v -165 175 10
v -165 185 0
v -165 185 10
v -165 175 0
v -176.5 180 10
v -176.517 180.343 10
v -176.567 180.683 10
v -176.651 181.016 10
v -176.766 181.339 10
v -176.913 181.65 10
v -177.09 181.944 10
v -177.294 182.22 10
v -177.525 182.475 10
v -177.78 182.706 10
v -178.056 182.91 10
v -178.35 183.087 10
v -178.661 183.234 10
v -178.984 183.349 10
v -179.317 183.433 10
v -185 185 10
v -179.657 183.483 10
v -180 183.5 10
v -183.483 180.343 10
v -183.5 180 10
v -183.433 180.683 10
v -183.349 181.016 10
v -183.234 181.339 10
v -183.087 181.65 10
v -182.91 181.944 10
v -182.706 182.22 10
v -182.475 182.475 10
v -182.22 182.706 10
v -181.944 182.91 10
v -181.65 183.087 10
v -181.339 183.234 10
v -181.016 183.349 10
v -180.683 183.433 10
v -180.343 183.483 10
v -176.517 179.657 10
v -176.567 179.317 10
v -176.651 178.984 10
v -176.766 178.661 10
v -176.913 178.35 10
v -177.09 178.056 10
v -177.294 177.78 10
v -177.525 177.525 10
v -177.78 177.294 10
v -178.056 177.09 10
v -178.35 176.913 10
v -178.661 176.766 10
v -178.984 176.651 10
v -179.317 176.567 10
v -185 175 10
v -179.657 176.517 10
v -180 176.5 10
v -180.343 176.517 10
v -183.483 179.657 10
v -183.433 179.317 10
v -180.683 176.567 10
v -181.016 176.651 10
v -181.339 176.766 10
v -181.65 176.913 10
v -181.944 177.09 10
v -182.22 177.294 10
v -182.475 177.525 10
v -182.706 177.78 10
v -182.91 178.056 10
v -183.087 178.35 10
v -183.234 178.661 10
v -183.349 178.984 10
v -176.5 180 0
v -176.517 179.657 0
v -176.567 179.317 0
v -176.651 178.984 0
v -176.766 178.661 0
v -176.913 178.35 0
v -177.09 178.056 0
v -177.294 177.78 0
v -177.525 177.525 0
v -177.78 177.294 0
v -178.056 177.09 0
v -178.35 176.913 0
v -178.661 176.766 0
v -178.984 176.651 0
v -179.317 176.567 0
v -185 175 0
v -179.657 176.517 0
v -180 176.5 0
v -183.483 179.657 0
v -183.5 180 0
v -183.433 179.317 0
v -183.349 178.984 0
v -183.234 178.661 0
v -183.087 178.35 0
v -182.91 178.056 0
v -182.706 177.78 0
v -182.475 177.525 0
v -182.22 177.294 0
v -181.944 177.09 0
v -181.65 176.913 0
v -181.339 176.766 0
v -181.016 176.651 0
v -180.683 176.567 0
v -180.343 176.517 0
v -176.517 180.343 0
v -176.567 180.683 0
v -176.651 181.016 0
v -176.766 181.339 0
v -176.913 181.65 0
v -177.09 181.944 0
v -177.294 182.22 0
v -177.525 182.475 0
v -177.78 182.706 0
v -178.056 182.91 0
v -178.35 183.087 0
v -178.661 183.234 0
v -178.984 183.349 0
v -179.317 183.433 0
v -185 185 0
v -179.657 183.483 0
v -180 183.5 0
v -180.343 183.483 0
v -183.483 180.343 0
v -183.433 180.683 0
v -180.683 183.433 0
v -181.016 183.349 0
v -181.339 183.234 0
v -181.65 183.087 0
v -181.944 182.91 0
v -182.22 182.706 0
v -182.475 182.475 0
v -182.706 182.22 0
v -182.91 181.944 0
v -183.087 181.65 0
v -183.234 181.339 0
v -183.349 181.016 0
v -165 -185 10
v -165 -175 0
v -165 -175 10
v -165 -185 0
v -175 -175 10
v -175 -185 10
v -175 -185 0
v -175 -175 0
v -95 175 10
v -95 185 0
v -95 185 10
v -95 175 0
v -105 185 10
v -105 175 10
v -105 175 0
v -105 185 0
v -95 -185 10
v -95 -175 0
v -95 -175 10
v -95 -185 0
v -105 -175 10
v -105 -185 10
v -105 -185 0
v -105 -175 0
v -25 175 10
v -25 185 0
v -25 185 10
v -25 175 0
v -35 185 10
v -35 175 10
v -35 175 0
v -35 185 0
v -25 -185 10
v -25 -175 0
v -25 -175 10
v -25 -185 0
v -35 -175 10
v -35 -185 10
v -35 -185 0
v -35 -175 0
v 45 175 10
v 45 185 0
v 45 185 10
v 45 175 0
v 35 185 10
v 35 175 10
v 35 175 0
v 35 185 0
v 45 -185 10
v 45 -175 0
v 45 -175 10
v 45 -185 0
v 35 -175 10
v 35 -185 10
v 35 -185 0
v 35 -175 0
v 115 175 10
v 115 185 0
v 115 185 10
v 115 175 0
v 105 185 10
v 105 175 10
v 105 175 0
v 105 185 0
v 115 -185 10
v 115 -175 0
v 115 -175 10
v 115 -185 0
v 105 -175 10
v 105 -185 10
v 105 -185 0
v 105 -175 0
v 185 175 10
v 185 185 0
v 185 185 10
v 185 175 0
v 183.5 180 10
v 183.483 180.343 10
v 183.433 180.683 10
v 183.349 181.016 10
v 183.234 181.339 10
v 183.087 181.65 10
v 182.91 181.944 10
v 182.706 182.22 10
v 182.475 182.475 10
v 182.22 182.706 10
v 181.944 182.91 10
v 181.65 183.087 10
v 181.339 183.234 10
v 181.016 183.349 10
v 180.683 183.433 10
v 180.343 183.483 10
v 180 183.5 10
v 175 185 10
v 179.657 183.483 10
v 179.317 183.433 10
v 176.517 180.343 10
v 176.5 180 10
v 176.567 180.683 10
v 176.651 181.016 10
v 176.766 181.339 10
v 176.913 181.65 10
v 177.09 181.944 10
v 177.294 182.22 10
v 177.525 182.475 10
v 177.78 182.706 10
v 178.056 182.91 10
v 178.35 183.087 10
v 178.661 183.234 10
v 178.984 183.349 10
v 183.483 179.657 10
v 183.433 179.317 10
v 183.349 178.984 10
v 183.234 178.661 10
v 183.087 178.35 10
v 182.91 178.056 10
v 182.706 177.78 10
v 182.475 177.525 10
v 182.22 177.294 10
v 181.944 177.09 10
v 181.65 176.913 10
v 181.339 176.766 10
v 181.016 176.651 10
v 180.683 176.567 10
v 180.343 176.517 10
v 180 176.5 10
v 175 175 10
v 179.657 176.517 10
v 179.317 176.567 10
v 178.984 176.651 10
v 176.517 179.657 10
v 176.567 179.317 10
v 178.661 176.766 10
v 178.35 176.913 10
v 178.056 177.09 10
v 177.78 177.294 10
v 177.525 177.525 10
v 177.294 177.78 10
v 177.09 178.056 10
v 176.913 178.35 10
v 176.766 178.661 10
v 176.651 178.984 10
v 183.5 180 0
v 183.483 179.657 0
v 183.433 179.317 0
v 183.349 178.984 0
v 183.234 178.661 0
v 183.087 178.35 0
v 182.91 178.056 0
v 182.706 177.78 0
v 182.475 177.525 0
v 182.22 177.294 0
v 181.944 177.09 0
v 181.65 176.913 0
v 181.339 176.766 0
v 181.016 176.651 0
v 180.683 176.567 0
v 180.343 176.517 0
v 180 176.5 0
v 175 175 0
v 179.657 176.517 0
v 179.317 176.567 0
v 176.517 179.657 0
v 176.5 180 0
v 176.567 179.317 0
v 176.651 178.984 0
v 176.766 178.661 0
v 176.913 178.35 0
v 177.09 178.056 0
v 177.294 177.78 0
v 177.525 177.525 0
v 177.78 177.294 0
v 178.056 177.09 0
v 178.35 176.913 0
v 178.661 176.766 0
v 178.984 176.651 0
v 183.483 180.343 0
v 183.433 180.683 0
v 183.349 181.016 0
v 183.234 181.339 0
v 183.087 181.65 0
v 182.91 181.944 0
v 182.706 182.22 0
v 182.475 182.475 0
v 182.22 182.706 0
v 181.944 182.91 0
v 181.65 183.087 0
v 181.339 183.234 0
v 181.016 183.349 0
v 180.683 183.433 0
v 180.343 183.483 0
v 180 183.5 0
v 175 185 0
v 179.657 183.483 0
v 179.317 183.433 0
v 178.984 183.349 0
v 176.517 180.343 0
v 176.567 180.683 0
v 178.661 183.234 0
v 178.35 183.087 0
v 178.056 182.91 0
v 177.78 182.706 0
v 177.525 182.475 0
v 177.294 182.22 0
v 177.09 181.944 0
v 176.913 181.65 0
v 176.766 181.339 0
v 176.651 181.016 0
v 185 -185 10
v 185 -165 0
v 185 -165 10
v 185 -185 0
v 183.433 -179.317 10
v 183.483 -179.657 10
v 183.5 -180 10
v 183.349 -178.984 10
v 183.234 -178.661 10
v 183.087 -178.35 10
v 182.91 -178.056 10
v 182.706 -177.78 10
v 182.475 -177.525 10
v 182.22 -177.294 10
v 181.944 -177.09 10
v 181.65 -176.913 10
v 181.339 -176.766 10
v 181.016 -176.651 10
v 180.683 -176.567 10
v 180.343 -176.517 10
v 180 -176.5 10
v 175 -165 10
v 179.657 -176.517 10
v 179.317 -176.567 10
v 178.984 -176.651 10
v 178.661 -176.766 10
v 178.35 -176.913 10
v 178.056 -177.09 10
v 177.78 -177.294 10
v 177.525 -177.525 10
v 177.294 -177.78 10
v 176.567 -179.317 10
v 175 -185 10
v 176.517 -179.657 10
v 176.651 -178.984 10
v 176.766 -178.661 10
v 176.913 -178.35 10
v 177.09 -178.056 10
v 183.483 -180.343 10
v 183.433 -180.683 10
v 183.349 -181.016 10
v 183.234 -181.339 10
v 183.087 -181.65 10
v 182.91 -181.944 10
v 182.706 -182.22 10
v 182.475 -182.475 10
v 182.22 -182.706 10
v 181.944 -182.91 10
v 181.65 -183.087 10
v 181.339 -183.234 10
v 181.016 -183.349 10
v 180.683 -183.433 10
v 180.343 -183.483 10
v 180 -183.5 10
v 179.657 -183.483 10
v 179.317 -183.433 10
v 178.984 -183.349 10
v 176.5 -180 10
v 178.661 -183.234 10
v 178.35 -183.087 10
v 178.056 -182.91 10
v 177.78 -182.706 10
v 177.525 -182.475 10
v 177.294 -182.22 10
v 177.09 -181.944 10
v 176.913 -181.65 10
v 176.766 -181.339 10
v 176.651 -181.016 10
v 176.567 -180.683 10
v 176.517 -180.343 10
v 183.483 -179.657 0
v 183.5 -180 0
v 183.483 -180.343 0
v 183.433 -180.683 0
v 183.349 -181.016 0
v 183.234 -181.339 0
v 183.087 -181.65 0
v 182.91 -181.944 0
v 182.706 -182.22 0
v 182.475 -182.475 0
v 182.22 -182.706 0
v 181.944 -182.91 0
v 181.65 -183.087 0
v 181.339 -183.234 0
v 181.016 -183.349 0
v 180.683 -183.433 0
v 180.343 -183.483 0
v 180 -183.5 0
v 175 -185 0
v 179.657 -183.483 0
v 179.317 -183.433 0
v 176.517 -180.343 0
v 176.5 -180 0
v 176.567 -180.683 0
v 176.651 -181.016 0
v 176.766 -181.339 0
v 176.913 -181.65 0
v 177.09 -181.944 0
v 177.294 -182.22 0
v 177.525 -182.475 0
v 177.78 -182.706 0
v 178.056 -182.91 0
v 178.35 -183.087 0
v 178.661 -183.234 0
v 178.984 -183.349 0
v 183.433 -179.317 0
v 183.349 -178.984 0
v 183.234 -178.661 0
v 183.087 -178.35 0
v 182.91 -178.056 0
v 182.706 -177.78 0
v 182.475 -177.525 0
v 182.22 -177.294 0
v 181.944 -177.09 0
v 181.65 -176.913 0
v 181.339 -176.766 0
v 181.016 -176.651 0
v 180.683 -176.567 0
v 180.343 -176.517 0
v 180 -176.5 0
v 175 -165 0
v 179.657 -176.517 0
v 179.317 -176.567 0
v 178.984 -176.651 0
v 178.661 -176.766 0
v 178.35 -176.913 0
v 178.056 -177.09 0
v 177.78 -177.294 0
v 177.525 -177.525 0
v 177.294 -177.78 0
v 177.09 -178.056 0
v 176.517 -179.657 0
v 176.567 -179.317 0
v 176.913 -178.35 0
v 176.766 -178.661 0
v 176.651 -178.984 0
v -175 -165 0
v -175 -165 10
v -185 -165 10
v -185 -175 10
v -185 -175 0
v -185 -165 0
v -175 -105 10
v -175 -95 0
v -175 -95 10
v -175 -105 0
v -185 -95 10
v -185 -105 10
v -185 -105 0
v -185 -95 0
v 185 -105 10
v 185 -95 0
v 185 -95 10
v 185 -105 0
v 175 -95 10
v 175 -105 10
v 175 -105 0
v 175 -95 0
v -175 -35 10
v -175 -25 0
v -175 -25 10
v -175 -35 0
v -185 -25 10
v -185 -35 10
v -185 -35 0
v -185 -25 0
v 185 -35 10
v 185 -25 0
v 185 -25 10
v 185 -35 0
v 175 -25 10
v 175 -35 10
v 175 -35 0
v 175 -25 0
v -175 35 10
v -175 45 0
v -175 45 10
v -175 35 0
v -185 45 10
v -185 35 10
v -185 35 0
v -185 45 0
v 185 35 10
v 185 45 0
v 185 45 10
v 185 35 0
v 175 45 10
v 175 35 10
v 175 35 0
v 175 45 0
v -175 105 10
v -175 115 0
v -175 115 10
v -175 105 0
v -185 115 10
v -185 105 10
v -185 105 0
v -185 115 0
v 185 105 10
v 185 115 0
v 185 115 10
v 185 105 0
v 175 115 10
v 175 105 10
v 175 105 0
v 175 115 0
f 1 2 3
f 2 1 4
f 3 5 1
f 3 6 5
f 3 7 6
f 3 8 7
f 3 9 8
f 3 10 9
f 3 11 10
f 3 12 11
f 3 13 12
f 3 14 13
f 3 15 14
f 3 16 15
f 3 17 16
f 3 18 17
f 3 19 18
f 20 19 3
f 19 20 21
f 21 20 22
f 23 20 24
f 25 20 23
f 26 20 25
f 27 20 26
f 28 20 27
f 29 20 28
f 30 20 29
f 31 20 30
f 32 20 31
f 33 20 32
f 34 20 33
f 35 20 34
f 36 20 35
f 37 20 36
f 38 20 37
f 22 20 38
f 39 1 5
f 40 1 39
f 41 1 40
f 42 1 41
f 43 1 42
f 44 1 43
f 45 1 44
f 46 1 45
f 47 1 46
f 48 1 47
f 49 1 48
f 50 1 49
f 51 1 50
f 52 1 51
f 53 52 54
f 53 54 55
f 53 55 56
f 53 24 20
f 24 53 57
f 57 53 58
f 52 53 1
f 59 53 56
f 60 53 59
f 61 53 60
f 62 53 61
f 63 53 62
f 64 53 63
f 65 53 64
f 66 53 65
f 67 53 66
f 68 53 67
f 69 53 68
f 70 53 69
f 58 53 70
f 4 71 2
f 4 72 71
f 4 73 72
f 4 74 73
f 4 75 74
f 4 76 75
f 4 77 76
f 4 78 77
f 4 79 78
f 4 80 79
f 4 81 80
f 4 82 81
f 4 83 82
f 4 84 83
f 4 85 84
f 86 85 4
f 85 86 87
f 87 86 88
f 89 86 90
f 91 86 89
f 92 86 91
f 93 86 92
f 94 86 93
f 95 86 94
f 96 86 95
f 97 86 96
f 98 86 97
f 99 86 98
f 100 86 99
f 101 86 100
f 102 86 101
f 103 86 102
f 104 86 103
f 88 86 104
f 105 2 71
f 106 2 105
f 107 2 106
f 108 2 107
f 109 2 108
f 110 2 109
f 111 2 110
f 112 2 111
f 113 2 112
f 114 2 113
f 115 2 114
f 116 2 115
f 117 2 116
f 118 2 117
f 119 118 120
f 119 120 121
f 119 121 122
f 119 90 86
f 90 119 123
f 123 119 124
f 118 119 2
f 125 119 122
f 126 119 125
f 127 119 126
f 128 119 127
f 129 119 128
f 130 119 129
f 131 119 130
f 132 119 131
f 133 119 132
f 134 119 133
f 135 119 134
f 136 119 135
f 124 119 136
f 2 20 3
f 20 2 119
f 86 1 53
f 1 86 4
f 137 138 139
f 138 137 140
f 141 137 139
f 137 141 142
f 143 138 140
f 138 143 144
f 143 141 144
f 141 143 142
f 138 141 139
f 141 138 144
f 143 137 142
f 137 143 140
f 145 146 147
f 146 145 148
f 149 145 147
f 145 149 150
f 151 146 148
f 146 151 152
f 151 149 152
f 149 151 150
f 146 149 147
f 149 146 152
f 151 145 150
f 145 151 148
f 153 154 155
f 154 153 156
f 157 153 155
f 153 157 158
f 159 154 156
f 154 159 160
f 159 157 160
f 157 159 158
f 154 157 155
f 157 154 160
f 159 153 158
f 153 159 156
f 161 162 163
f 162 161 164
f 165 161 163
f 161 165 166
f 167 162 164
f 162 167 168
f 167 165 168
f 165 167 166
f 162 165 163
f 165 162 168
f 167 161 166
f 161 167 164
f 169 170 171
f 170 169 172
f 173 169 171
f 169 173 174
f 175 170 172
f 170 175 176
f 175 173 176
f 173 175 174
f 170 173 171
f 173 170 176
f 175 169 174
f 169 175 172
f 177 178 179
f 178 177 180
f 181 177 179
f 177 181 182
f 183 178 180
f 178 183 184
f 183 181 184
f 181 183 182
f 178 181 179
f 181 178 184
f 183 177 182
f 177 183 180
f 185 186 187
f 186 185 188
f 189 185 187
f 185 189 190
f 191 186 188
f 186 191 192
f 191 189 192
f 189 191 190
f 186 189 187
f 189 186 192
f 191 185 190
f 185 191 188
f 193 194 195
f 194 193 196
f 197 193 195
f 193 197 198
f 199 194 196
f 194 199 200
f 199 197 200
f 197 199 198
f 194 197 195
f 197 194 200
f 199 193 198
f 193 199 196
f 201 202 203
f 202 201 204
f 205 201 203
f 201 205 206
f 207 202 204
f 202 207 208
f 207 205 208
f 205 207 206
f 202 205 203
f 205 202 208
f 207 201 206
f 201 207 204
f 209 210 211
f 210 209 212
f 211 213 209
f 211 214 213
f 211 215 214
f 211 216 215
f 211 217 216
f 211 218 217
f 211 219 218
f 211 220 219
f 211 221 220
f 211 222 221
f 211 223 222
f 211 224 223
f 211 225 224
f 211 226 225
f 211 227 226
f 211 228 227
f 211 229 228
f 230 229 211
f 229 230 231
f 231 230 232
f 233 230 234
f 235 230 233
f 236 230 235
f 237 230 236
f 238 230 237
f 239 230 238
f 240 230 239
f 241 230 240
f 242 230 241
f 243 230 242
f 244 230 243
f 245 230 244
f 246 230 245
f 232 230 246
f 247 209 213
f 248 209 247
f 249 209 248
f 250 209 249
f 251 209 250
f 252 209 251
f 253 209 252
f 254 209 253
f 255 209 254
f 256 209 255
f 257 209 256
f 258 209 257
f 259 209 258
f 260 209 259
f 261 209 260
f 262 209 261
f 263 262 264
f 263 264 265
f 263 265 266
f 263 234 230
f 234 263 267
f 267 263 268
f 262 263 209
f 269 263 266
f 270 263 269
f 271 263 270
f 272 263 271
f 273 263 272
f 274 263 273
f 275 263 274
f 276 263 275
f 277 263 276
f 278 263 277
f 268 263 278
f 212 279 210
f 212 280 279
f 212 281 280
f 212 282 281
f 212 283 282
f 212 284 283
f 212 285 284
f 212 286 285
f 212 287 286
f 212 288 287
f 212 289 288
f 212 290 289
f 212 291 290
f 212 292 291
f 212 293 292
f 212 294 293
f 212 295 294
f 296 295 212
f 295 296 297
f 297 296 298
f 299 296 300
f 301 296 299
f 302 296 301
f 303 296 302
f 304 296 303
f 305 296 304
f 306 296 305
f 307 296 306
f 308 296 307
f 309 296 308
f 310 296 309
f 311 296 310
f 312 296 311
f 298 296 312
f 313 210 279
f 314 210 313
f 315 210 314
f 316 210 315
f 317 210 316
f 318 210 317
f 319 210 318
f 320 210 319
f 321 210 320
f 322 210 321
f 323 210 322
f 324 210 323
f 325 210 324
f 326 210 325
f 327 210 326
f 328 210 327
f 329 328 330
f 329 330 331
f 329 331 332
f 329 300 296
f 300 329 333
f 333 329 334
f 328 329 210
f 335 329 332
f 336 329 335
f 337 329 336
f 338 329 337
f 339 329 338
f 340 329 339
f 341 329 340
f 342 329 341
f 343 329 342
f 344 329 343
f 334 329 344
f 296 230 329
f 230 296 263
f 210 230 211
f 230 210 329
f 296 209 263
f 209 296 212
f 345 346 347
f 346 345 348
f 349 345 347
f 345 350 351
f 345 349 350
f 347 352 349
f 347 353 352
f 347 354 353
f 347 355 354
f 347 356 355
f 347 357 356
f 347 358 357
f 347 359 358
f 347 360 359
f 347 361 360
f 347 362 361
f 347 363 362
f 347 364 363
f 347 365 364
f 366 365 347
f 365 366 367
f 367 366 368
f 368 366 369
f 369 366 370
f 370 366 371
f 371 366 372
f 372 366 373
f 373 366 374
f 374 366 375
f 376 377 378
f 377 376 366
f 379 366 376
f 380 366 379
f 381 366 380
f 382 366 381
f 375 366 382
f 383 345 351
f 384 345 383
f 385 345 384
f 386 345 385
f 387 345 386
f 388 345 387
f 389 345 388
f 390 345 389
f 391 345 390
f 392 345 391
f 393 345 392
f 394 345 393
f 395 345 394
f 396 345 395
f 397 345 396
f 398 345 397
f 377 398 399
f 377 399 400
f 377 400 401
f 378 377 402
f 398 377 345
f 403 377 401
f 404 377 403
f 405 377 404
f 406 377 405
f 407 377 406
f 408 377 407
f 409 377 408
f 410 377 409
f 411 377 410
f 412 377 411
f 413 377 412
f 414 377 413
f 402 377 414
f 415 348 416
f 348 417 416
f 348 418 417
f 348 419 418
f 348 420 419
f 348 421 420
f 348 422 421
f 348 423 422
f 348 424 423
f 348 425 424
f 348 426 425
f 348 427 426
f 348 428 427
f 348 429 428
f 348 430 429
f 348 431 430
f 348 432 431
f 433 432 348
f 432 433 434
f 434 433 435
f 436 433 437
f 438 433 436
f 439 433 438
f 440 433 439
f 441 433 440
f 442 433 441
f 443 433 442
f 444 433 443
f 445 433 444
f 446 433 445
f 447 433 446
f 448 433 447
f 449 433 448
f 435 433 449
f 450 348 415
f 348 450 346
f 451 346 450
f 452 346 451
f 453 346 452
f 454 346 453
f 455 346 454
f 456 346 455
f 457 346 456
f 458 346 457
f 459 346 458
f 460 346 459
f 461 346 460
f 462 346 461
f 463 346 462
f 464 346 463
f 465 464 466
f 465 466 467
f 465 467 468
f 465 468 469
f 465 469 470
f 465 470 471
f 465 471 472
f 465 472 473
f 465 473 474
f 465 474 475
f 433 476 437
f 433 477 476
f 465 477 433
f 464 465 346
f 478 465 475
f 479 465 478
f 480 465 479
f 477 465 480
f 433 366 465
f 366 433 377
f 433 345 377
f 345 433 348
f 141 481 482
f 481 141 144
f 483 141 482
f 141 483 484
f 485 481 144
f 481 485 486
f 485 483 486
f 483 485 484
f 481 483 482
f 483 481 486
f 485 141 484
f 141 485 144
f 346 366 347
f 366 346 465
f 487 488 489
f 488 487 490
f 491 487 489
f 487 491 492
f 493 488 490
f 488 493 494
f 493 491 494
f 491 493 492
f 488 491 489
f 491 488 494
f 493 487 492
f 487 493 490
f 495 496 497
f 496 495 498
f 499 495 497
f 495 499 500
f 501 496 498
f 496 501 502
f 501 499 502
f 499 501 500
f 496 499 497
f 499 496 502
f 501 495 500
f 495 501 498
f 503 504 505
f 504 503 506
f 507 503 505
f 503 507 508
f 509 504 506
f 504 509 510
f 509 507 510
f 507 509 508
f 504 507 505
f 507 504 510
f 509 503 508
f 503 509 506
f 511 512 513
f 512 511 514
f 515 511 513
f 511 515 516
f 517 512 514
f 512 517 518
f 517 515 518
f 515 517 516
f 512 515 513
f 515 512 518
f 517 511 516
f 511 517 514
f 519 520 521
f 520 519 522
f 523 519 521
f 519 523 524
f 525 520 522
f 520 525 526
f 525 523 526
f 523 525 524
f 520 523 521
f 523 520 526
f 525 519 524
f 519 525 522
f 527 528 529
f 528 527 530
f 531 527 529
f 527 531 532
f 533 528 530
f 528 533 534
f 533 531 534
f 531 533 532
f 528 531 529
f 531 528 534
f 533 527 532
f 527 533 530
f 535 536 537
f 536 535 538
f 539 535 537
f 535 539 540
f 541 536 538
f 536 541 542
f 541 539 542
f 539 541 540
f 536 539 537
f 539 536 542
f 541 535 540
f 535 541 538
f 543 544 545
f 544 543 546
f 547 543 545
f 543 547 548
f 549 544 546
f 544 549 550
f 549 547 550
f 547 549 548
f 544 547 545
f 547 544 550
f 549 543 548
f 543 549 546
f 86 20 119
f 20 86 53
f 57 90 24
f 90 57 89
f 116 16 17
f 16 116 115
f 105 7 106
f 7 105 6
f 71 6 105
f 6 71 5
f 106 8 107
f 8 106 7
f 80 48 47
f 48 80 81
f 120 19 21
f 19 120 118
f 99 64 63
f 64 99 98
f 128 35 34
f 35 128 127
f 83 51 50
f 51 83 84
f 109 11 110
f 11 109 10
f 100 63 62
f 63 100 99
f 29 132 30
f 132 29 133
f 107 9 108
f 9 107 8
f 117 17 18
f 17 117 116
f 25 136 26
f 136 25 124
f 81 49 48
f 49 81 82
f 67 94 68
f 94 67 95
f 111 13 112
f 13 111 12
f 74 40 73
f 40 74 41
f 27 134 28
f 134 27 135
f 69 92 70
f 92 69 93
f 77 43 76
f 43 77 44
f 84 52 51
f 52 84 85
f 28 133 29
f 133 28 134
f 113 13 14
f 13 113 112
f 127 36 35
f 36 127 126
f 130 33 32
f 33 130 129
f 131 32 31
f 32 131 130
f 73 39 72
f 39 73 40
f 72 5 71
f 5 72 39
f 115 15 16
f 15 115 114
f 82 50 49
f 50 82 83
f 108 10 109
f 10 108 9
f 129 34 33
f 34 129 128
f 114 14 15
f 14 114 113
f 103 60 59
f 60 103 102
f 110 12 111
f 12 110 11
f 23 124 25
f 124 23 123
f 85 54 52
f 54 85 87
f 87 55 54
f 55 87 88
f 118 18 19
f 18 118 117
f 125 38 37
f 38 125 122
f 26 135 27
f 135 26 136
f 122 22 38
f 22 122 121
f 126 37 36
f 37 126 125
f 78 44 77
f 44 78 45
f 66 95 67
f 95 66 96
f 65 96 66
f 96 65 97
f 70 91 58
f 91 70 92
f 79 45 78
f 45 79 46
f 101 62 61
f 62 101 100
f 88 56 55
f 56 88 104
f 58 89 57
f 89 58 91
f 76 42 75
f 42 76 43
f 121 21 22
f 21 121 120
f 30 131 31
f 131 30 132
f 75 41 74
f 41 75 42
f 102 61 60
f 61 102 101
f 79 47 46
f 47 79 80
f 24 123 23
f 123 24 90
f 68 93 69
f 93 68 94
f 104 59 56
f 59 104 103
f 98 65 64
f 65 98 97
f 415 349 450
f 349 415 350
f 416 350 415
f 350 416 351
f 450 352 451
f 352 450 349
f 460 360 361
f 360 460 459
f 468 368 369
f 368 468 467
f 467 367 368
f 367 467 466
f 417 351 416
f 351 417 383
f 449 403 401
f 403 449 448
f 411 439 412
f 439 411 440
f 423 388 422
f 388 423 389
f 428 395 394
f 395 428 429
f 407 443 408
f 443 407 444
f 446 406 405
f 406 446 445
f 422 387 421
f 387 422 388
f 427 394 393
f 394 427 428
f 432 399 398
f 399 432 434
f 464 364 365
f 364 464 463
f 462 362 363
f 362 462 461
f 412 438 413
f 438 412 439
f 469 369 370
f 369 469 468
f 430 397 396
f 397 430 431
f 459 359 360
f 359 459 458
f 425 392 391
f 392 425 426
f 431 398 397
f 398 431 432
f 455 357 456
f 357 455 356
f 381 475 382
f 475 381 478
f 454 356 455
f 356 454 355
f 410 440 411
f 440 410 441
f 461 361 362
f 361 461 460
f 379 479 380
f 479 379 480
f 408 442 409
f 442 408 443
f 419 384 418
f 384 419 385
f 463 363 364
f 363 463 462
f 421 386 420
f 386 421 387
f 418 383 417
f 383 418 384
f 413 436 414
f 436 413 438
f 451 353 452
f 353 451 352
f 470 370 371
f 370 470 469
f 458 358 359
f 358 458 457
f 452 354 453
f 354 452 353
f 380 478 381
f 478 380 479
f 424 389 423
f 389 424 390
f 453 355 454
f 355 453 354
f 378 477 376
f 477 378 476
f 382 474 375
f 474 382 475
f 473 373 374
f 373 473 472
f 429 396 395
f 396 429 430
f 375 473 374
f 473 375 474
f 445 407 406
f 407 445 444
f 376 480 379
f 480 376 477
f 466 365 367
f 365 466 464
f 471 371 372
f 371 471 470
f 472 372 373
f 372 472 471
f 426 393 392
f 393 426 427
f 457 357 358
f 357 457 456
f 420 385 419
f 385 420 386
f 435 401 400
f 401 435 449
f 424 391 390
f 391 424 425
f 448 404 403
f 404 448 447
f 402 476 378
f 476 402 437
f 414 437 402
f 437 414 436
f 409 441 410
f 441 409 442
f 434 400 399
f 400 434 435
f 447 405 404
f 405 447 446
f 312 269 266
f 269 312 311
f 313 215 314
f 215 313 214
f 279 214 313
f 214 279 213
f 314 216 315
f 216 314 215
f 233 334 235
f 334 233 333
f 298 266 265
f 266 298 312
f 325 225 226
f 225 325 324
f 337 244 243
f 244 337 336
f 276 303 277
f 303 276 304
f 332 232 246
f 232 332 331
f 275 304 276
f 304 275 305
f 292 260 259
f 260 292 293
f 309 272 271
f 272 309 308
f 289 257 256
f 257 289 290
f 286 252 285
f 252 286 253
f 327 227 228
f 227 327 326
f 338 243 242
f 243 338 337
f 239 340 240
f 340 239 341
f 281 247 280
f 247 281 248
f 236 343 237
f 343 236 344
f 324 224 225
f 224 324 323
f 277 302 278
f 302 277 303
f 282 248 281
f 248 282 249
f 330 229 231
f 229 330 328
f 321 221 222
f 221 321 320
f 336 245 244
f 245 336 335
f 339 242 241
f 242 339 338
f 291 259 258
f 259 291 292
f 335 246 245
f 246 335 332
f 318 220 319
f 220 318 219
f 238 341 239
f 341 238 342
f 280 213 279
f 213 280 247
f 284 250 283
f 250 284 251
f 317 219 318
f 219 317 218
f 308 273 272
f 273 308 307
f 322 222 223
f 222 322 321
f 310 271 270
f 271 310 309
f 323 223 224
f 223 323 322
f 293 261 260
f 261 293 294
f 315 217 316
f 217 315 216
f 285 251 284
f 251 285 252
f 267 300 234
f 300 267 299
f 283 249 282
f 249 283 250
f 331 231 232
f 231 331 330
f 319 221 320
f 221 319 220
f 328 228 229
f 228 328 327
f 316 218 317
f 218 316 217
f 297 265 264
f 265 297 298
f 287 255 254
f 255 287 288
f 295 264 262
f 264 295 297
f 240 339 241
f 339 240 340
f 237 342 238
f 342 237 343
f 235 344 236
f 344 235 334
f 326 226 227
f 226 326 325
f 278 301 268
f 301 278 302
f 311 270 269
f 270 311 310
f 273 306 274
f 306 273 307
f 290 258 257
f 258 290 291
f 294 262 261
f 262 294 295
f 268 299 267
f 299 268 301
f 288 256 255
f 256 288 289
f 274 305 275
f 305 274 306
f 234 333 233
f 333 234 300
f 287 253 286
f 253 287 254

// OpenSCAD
// ring_61.scad - ring index 61 (z bottom = 610 mm)
$fn = 64; bar = 10; half_b = bar/2; outer = 370; half_outer = outer/2;
front_y = 180; back_y = -180; left_x = -180; right_x = 180;
x_centers = [-170, -100, -30, 40, 110, 180];
z_centers = [5, 85, 155, 225, 295, 365, 435, 505, 575, 645, 715]; ring_z = 610;
module place_box(cx, cy, sx, sy) { translate([cx - sx/2, cy - sy/2, 0]) cube([sx, sy, bar]); }

difference() { union() {
    for (x = x_centers) { place_box(x, front_y, bar, bar); place_box(x, back_y, bar, bar); }
    for (y = x_centers) { place_box(left_x, y, bar, bar); place_box(right_x, y, bar, bar); }
    for (zc = z_centers) if ((zc - half_b < ring_z + bar) && (zc + half_b > ring_z)) {
        translate([-half_outer, front_y - half_b, 0]) cube([outer, bar, bar]);
        translate([-half_outer, back_y - half_b, 0])  cube([outer, bar, bar]);
        translate([left_x - half_b, -half_outer, 0])  cube([bar, outer, bar]);
        translate([right_x - half_b, -half_outer, 0]) cube([bar, outer, bar]);
    }
  }
  for (cx = [-180, 180]) for (cy = [-180, 180]) translate([cx, cy, 0]) cylinder(h = bar, r = 3.5, $fn = 64);
}
